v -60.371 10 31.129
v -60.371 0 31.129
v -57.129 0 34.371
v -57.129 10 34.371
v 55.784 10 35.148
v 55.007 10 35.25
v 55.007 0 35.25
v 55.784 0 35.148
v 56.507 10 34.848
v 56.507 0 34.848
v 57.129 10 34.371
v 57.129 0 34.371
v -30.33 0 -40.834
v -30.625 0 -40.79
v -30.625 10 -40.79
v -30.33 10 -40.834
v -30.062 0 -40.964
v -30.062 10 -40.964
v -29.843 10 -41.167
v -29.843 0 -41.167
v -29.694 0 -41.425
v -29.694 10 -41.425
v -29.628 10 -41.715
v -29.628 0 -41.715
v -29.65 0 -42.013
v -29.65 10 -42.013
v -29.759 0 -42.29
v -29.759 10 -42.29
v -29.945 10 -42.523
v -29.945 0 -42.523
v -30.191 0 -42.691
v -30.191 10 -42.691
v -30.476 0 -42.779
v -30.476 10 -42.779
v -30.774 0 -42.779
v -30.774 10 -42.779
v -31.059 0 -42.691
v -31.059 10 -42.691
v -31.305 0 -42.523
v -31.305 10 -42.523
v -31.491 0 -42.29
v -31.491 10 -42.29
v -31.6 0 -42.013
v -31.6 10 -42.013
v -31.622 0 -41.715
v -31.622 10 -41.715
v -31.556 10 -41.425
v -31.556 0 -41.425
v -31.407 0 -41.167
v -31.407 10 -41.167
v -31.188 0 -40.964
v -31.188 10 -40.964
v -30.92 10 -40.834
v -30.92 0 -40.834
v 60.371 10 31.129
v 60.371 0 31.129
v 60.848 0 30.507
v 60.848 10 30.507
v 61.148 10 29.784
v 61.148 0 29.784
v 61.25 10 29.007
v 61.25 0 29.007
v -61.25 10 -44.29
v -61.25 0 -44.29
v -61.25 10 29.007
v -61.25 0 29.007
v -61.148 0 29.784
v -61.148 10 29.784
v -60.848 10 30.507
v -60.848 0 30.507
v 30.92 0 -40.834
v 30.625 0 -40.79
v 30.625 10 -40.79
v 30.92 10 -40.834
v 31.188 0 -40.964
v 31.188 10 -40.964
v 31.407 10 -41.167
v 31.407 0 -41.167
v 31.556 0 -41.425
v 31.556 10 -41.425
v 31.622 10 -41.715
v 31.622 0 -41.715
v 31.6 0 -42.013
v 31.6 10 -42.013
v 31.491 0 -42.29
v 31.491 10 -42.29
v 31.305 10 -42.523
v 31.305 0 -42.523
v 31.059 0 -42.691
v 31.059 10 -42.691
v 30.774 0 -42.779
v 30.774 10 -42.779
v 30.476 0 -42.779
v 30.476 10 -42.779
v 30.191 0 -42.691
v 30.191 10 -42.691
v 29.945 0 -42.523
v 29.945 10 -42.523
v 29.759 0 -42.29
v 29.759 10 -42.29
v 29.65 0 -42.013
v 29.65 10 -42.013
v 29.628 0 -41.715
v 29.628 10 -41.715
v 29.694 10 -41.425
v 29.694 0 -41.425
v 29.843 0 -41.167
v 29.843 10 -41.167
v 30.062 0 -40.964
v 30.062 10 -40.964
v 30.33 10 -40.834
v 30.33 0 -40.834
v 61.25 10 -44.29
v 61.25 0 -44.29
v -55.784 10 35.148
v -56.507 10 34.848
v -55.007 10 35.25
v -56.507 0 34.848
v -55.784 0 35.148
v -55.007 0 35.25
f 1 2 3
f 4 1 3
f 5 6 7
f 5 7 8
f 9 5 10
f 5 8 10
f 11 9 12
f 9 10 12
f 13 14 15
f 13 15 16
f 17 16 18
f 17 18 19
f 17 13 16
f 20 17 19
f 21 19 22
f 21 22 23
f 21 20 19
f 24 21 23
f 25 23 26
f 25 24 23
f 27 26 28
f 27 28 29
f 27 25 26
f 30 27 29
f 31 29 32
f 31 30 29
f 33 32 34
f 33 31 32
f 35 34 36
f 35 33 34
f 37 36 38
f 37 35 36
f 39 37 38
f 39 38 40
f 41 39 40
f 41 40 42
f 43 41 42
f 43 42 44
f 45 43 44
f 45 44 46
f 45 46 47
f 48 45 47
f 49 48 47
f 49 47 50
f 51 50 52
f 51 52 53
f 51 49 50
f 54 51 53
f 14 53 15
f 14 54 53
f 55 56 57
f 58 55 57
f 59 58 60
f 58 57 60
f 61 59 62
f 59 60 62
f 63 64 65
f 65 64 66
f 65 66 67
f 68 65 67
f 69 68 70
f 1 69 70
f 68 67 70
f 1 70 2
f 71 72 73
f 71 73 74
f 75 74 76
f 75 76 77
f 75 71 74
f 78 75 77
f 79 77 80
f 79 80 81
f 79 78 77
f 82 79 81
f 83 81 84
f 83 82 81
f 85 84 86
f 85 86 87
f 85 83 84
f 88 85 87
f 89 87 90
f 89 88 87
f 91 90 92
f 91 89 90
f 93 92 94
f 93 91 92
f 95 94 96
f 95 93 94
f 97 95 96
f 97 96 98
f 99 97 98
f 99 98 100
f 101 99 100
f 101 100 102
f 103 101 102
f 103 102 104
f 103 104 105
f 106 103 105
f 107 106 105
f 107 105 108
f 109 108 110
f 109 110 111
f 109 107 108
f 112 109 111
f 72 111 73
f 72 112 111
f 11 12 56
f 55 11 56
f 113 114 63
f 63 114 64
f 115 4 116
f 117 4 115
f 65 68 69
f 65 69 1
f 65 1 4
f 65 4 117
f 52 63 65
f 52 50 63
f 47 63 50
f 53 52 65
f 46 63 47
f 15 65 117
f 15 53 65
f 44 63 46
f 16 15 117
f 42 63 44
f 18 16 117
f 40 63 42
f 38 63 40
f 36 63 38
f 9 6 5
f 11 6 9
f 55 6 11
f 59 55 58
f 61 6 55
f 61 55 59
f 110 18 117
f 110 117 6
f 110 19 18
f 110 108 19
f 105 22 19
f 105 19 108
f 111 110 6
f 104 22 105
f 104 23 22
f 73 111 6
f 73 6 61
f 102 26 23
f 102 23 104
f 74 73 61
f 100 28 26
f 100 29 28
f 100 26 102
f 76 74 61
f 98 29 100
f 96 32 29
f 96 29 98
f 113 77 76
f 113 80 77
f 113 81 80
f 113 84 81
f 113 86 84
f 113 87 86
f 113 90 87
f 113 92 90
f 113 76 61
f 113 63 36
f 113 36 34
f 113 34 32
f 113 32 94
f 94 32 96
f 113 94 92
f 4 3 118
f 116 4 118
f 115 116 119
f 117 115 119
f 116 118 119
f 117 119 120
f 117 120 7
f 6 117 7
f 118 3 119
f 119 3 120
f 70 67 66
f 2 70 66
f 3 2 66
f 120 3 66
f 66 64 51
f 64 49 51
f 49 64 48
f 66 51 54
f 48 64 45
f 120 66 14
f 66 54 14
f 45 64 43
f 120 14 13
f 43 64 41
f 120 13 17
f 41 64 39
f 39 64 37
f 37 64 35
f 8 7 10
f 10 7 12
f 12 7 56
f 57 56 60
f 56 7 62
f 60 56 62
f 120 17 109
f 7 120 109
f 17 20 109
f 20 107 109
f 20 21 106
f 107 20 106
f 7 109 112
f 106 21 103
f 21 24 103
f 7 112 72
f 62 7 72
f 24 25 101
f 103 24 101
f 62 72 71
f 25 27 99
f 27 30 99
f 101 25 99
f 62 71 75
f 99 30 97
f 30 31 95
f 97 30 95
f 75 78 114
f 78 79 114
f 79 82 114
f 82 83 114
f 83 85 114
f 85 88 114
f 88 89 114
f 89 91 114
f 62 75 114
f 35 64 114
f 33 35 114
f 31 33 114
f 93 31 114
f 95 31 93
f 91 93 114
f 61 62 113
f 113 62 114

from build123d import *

# Parameters (mm, degrees)
SKETCH2_R           = 1
BOSS_EXTRUDE1_DEPTH = 10


with BuildPart() as part:
    # Sketch2 → Boss-Extrude1 (new body)
    with BuildSketch(Plane(origin=(0, 0, 0), x_dir=(1, 0, 0), z_dir=(0, 1, 0))):
        with BuildLine():
            Line((-61.25, 44.29), (-61.25, -29.007359313))
            ThreePointArc((-61.25, -29.007359313), (-61.021638598, -30.15540961), (-60.371320344, -31.128679656))
            Line((-60.371320344, -31.128679656), (-57.128679656, -34.371320344))
            ThreePointArc((-57.128679656, -34.371320344), (-56.15540961, -35.021638598), (-55.007359313, -35.25))
            Line((-55.007359313, -35.25), (55.007359313, -35.25))
            ThreePointArc((55.007359313, -35.25), (56.15540961, -35.021638598), (57.128679656, -34.371320344))
            Line((57.128679656, -34.371320344), (60.371320344, -31.128679656))
            ThreePointArc((60.371320344, -31.128679656), (61.021638598, -30.15540961), (61.25, -29.007359313))
            Line((61.25, -29.007359313), (61.25, 44.29))
            Line((61.25, 44.29), (-61.25, 44.29))
        make_face()
        with Locations(Location((-30.625, 41.79, 0), (0, 0, 270))):
            Circle(SKETCH2_R, mode=Mode.SUBTRACT)
        with Locations(Location((30.625, 41.79, 0), (0, 0, 270))):
            Circle(SKETCH2_R, mode=Mode.SUBTRACT)
    extrude(amount=BOSS_EXTRUDE1_DEPTH)


solid = part.part
